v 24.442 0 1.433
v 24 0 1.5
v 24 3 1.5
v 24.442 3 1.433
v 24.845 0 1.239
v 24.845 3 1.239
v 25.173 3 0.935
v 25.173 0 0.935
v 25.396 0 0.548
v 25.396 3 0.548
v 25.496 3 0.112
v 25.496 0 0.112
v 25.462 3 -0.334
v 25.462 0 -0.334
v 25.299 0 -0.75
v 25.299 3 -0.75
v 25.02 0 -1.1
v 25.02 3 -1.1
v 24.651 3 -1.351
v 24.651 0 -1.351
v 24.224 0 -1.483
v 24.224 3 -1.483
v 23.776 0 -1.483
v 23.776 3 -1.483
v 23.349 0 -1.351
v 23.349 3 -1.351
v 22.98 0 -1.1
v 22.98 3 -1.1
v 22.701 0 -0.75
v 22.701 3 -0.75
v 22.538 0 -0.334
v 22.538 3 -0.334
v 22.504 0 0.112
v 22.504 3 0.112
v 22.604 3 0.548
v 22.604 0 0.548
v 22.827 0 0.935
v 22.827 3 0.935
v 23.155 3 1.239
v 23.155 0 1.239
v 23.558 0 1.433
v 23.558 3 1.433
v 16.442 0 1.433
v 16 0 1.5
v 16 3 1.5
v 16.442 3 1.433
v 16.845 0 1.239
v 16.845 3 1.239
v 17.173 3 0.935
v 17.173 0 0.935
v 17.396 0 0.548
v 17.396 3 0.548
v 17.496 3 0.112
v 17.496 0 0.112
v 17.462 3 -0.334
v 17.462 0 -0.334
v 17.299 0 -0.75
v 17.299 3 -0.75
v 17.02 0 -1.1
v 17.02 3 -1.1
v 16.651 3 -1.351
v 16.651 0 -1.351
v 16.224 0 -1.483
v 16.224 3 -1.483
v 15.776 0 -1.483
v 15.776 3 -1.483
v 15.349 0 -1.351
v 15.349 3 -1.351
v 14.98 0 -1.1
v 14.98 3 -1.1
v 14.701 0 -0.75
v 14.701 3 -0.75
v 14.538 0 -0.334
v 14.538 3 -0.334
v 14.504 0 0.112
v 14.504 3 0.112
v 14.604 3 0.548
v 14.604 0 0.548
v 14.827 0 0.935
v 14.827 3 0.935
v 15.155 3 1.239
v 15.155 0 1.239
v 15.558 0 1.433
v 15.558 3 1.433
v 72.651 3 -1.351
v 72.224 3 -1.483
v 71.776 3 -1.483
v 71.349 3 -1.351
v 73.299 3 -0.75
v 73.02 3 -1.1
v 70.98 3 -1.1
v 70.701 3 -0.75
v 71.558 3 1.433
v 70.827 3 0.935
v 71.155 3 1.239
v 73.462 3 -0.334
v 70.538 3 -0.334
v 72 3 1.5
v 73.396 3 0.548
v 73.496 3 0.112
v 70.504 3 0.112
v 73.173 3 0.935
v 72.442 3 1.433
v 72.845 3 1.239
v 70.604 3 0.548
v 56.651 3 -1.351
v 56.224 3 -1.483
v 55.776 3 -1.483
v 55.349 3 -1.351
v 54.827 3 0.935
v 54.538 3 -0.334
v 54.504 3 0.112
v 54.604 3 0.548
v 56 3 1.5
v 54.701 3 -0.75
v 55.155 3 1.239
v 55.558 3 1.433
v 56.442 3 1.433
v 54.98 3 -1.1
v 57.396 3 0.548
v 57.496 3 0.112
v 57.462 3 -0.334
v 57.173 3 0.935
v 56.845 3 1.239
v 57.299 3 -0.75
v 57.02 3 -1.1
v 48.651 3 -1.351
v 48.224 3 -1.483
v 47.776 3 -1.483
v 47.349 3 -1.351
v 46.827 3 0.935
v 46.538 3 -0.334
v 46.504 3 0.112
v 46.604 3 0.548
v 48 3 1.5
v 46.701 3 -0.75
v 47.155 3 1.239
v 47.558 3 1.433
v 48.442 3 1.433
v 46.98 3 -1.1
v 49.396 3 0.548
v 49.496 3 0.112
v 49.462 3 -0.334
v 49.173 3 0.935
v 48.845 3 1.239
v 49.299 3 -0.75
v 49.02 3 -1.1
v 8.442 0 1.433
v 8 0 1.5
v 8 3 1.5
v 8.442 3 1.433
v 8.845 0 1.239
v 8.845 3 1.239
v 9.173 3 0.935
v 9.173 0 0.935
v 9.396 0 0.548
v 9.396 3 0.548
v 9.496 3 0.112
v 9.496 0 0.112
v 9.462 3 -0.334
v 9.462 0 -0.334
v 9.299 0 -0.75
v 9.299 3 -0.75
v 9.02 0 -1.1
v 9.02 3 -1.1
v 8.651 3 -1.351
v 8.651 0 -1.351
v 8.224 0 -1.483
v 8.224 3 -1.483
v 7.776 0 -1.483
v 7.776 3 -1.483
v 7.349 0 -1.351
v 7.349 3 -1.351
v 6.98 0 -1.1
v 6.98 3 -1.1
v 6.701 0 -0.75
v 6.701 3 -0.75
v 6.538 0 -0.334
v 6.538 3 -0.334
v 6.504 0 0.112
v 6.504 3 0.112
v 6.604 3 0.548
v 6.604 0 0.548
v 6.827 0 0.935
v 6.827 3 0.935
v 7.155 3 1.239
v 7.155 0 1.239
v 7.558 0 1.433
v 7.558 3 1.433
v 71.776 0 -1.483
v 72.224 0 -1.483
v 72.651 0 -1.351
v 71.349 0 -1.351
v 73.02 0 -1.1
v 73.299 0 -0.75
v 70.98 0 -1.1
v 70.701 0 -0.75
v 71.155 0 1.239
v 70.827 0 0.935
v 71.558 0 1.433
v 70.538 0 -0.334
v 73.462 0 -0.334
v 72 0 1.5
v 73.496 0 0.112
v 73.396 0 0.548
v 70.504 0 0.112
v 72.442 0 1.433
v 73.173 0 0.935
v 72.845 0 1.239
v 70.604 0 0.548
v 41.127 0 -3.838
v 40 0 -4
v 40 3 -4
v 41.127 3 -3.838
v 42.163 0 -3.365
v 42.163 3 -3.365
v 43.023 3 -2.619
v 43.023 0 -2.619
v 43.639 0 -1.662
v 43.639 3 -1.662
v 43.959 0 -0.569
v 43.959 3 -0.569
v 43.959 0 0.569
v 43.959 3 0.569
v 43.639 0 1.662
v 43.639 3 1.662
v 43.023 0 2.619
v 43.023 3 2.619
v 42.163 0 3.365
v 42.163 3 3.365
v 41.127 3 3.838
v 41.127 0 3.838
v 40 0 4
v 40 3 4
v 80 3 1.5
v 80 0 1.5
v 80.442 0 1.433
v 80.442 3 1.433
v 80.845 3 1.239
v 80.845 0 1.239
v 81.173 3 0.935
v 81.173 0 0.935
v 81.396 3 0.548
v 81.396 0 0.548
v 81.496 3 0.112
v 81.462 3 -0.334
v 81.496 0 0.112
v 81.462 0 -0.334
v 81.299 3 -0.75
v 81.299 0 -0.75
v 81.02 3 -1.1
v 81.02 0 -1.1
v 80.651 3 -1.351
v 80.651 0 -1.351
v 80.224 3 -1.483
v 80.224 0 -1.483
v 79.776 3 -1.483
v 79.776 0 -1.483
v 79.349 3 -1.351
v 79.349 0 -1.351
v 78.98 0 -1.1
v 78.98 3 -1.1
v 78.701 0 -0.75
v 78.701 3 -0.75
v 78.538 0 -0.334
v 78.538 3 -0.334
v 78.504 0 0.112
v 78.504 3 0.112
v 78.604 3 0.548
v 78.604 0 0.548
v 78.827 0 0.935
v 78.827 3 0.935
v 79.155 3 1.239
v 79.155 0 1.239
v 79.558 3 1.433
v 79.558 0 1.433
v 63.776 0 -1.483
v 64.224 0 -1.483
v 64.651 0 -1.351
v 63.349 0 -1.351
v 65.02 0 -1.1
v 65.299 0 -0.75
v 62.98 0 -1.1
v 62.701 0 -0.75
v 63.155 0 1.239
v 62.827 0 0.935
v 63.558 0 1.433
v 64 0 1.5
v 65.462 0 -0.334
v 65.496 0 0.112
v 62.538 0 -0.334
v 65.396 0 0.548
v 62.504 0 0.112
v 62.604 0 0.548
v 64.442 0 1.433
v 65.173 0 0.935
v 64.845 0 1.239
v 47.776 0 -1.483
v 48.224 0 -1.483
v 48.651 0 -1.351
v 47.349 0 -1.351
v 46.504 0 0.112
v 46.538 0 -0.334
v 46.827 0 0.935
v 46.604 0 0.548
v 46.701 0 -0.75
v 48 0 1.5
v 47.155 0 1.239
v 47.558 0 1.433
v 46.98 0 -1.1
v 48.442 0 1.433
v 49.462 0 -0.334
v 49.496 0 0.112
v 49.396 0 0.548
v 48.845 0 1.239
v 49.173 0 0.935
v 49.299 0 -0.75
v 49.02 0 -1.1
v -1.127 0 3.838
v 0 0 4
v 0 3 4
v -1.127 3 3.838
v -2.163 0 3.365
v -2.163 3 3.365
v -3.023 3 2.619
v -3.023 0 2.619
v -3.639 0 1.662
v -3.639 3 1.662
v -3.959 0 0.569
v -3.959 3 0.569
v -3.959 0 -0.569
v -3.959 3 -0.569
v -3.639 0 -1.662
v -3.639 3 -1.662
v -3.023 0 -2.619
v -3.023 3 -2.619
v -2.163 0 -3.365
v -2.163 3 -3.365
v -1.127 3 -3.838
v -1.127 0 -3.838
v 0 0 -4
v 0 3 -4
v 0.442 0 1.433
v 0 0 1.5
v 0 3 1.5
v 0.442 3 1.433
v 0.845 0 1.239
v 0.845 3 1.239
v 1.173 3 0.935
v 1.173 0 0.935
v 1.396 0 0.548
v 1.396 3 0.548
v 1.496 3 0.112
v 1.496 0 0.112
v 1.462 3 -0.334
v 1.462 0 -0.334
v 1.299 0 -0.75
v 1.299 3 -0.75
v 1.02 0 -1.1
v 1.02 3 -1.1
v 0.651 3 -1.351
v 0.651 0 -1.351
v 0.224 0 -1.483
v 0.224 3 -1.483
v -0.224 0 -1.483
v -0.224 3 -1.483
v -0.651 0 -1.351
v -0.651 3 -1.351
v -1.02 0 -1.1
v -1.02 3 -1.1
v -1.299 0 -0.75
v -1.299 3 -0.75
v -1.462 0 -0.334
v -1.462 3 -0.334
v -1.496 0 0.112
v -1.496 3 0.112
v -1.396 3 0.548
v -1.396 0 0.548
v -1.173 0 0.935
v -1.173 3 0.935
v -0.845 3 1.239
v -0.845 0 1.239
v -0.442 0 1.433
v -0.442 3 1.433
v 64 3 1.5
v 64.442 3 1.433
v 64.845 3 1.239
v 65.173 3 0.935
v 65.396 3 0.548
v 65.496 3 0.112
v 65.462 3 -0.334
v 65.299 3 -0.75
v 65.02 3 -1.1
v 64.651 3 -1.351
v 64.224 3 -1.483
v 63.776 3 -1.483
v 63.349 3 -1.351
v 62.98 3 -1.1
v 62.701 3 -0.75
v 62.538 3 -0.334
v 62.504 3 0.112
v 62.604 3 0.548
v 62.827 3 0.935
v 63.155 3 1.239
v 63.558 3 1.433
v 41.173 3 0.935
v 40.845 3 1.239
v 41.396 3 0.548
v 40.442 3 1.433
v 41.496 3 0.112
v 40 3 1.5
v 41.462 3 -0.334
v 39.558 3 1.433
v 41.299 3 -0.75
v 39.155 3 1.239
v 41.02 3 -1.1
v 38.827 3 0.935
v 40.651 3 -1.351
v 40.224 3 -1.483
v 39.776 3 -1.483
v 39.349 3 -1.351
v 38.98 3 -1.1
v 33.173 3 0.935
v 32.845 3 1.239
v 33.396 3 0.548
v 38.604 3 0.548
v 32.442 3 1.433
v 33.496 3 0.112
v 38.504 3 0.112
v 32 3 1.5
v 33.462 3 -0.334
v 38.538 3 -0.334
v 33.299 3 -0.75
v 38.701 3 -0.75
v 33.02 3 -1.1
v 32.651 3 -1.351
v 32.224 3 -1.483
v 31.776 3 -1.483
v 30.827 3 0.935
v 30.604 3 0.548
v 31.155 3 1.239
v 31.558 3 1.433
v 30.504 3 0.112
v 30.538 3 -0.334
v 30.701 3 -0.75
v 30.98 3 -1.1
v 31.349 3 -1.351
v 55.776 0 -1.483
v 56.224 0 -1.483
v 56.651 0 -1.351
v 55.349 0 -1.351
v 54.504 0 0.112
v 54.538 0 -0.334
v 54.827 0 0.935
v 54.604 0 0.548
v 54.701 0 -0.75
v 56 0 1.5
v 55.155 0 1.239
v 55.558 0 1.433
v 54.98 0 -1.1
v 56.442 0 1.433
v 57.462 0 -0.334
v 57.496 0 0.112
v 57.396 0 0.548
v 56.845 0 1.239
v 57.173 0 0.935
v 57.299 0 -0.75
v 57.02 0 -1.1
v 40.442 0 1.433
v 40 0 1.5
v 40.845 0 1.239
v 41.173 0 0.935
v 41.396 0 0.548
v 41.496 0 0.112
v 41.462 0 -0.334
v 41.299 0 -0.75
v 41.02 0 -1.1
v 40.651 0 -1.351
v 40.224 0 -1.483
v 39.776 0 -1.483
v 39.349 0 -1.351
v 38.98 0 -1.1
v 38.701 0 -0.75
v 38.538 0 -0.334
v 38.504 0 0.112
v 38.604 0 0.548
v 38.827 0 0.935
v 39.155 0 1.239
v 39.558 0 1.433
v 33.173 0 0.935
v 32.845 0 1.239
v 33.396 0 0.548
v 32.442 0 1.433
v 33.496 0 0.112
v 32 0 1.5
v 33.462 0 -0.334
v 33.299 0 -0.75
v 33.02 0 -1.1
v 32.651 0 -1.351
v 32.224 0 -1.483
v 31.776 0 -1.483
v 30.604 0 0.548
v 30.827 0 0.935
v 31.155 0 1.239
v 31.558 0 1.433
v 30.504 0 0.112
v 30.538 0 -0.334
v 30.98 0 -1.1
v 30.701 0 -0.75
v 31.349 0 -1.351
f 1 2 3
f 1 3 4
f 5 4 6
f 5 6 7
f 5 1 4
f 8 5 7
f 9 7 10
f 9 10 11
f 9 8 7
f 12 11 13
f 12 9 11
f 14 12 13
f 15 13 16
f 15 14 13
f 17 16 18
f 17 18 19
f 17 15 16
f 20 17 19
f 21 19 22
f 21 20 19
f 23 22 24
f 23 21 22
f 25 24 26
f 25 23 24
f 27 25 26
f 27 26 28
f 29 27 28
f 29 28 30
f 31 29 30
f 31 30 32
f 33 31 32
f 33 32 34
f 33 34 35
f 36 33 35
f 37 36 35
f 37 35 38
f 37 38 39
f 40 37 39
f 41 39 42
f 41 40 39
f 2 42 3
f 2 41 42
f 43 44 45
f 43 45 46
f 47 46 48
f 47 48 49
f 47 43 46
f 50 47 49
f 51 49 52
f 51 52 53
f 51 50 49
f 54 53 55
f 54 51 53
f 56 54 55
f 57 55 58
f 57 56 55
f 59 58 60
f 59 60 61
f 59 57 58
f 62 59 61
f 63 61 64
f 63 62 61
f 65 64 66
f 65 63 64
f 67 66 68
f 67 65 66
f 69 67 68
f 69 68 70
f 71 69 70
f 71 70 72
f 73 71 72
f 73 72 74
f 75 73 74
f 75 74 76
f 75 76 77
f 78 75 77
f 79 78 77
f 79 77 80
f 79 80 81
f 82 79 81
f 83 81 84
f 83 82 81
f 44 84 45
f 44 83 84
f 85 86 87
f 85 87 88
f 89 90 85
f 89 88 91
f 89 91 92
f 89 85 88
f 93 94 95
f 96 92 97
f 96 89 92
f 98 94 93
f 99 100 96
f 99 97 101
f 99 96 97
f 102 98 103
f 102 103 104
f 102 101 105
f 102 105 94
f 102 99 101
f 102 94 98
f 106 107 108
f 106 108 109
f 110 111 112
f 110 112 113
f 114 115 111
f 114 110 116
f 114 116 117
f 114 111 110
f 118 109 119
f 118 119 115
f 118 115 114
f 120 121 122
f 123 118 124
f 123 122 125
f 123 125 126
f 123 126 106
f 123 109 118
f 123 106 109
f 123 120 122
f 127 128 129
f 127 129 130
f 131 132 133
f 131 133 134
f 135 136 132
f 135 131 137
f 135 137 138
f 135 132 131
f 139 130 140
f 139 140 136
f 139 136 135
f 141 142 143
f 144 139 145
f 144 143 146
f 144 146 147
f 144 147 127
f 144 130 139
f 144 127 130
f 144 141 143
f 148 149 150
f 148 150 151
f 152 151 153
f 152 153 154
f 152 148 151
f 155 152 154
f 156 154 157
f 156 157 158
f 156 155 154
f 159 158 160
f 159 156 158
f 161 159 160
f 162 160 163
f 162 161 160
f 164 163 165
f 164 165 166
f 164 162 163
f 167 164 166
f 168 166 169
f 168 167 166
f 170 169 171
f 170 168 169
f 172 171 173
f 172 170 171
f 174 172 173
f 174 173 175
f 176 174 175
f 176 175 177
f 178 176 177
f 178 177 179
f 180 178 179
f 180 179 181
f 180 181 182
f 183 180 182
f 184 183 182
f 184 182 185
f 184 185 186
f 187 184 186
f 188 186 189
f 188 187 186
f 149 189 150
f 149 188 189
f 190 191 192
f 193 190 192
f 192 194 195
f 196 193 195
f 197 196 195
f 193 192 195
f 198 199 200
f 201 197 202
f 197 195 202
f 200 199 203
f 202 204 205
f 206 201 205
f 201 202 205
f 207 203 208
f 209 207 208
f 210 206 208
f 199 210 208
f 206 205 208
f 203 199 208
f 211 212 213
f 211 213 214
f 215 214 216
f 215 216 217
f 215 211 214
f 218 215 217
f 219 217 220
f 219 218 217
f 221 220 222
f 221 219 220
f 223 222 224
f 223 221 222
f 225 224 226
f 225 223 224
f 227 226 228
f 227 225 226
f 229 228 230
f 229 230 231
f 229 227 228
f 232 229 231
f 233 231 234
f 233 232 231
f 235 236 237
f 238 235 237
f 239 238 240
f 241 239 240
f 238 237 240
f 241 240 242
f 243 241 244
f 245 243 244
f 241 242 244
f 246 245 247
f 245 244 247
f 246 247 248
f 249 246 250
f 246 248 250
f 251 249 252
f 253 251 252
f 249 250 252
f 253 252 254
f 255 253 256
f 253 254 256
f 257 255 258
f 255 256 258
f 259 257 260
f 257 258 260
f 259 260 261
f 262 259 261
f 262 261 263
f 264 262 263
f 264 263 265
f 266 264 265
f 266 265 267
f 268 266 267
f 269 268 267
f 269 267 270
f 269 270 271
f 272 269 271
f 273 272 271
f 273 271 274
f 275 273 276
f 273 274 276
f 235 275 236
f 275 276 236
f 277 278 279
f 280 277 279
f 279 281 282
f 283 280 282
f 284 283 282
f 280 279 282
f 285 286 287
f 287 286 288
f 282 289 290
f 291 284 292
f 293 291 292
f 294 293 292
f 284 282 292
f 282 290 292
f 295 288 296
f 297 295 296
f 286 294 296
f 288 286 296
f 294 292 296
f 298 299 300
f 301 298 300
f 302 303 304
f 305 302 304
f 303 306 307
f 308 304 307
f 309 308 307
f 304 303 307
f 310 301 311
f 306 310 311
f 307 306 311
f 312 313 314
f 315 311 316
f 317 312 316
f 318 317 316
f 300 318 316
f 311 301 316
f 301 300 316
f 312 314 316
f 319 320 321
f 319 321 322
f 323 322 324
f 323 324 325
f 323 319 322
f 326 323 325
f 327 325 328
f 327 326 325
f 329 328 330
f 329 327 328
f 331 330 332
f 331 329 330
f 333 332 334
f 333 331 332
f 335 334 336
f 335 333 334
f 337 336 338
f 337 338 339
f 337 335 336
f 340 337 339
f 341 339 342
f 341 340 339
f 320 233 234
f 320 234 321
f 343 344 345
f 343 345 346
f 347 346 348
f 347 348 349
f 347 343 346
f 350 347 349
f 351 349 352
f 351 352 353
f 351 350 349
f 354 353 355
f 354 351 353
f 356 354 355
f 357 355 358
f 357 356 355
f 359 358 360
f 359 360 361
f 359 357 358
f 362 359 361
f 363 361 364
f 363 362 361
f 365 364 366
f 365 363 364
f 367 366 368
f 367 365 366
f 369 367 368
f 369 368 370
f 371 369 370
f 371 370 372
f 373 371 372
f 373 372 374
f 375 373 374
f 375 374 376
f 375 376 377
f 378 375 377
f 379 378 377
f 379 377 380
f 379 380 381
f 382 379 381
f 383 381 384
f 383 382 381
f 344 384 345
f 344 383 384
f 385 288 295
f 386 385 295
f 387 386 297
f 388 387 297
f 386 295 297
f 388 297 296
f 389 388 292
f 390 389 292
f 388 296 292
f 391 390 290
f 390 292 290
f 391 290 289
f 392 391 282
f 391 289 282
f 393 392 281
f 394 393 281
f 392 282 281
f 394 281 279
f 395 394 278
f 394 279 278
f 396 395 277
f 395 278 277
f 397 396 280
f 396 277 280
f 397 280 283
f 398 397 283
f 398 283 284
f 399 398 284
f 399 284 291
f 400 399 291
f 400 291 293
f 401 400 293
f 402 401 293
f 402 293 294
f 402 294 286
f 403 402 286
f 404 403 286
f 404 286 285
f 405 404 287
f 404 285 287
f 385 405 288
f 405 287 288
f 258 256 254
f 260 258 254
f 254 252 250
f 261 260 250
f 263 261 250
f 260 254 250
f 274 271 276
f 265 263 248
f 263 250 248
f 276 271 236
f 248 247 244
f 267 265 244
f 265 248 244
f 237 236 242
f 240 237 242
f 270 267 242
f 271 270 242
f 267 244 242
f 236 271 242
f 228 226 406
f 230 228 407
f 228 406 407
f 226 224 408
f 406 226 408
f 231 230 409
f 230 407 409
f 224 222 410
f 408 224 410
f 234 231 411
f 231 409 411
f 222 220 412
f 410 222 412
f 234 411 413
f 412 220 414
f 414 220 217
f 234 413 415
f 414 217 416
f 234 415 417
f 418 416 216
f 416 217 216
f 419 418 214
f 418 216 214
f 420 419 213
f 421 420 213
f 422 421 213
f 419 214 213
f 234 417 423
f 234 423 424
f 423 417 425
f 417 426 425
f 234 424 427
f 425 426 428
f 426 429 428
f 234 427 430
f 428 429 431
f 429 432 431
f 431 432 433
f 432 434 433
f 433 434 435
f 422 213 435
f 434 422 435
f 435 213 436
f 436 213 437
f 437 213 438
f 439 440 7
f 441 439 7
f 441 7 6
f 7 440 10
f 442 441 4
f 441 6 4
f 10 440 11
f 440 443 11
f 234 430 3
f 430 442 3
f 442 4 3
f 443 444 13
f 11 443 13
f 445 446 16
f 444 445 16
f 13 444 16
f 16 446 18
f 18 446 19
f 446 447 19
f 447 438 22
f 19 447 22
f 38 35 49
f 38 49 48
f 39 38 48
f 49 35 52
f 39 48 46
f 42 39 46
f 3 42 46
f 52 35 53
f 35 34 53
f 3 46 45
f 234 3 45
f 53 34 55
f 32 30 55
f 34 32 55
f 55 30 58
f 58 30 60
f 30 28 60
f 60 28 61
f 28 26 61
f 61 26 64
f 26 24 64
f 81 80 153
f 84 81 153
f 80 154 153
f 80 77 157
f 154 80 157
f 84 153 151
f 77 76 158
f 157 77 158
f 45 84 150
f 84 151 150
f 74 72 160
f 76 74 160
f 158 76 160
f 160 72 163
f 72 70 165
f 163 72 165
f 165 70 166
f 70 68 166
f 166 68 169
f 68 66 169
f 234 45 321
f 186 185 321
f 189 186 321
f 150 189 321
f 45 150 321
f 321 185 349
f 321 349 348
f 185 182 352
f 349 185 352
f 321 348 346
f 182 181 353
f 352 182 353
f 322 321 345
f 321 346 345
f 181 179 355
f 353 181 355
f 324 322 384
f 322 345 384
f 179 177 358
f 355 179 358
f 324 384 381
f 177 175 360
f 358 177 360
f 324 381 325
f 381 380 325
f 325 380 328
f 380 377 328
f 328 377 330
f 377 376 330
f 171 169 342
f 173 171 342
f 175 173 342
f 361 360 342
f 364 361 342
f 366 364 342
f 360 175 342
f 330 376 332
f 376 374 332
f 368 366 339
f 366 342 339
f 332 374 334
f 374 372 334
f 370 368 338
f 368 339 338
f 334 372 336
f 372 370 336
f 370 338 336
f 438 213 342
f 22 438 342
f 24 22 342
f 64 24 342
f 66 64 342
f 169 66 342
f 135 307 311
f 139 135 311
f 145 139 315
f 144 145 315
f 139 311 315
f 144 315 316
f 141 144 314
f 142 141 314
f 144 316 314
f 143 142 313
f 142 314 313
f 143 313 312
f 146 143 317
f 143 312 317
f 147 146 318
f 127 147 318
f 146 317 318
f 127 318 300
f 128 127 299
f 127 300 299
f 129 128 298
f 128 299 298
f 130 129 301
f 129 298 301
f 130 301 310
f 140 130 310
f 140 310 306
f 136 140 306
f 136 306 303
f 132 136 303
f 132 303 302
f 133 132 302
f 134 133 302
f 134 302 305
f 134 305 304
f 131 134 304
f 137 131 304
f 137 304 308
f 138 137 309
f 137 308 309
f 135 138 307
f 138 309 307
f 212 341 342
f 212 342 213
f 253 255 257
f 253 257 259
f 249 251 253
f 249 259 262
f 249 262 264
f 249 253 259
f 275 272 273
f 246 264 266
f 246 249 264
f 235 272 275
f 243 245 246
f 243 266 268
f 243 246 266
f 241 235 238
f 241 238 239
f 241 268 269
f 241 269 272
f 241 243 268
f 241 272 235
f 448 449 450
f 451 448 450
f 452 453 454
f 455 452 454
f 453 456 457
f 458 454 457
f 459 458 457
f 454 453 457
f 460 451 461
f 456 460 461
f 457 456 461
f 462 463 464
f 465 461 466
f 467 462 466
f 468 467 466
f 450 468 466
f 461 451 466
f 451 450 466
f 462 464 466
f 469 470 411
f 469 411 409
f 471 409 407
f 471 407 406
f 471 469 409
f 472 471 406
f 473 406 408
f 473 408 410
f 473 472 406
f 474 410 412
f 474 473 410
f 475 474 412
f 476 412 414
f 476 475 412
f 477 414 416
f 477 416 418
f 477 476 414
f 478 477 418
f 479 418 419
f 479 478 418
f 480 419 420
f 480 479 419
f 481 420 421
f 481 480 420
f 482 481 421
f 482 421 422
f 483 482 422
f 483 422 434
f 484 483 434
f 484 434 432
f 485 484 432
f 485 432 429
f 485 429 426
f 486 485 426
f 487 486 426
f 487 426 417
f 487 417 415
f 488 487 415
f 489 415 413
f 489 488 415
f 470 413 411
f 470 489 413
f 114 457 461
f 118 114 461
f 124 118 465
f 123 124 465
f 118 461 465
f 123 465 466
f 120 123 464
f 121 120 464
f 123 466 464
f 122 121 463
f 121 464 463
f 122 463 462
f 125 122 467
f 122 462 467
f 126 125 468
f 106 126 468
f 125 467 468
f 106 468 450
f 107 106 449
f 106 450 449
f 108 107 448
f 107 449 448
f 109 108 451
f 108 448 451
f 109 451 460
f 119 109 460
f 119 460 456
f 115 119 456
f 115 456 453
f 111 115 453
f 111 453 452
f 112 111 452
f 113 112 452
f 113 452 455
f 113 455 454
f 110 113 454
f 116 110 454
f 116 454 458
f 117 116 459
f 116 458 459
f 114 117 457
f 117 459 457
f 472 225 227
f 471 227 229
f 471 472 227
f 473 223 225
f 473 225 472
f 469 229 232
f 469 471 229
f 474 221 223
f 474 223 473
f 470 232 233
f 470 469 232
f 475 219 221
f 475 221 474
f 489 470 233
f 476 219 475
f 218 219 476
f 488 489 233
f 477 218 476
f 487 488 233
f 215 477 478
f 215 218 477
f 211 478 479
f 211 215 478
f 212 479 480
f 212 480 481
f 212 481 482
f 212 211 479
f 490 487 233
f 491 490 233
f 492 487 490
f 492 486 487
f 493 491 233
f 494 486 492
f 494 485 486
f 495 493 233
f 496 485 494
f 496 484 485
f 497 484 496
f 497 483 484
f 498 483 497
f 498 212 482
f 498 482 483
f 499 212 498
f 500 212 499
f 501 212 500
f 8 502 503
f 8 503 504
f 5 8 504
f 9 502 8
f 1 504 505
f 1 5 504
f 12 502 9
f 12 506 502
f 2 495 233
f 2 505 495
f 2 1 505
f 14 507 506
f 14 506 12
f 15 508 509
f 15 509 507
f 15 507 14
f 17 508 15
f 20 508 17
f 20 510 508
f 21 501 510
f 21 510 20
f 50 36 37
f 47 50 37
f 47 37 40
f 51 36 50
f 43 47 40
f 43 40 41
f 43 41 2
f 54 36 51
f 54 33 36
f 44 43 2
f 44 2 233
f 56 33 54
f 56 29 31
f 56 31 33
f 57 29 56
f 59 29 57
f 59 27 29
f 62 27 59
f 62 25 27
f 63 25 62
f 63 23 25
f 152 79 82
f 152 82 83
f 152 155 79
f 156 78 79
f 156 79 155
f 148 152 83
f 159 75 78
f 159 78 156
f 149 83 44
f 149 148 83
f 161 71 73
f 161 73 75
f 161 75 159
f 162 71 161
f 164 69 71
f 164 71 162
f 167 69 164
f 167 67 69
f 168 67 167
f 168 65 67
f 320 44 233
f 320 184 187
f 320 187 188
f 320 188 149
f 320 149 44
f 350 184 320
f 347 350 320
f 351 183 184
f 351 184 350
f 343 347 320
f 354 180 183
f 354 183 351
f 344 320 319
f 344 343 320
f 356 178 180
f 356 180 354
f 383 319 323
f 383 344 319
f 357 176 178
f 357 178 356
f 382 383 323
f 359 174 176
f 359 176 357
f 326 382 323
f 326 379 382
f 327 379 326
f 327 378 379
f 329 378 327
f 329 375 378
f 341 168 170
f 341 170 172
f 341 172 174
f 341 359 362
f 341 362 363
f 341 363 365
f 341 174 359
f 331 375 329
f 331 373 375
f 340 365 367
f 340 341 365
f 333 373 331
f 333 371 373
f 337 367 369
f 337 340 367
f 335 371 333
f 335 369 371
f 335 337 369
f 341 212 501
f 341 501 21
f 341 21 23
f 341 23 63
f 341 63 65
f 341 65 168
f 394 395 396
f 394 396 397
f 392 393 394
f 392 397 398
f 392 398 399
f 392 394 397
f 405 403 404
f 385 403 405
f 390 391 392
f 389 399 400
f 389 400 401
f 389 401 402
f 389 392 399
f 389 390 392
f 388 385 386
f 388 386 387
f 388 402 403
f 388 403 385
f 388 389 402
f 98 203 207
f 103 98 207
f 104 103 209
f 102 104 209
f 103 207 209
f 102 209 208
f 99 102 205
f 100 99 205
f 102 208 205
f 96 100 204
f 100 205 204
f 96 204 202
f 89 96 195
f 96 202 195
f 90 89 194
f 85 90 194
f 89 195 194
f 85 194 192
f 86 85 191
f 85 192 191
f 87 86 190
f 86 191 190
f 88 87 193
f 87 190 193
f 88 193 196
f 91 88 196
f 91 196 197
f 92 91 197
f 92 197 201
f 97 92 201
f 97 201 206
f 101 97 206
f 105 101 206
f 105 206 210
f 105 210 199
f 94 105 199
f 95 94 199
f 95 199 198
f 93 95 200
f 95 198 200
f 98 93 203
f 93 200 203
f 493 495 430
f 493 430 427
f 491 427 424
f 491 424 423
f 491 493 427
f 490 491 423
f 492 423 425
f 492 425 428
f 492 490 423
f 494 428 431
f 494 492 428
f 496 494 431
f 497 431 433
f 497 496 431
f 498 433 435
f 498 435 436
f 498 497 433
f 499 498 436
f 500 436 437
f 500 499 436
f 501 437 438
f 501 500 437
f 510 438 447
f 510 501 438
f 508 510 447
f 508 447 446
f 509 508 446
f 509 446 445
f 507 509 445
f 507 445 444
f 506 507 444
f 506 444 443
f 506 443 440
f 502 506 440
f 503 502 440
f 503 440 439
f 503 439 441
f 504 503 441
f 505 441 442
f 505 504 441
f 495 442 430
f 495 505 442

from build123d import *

# Parameters (mm, degrees)
SKETCH2_R             = 1.5
BOSS_EXTRUDE2_DEPTH   = 3
BOSS_EXTRUDE2_2_DEPTH = 3
BOSS_EXTRUDE2_3_DEPTH = 3
BOSS_EXTRUDE2_4_DEPTH = 3
BOSS_EXTRUDE2_5_DEPTH = 3
BOSS_EXTRUDE2_6_DEPTH = 3


with BuildPart() as part:
    # Sketch2 → Boss-Extrude2 (new body)
    with BuildSketch(Plane(origin=(0, 0, 0), x_dir=(1, 0, 0), z_dir=(0, 1, 0))):
        with Locations(Location((48, 0, 0), (0, 0, 270))):
            Circle(SKETCH2_R)
    extrude(amount=BOSS_EXTRUDE2_DEPTH)


with BuildPart() as body_2:
    # Sketch2 → Boss-Extrude2 2 (new body)
    with BuildSketch(Plane(origin=(0, 0, 0), x_dir=(1, 0, 0), z_dir=(0, 1, 0))):
        with Locations(Location((56, 0, 0), (0, 0, 270))):
            Circle(SKETCH2_R)
    extrude(amount=BOSS_EXTRUDE2_2_DEPTH)


with BuildPart() as body_3:
    # Sketch2 → Boss-Extrude2 3 (new body)
    with BuildSketch(Plane(origin=(0, 0, 0), x_dir=(1, 0, 0), z_dir=(0, 1, 0))):
        with Locations(Location((64, 0, 0), (0, 0, 270))):
            Circle(SKETCH2_R)
    extrude(amount=BOSS_EXTRUDE2_3_DEPTH)


with BuildPart() as body_4:
    # Sketch2 → Boss-Extrude2 4 (new body)
    with BuildSketch(Plane(origin=(0, 0, 0), x_dir=(1, 0, 0), z_dir=(0, 1, 0))):
        with Locations(Location((72, 0, 0), (0, 0, 270))):
            Circle(SKETCH2_R)
    extrude(amount=BOSS_EXTRUDE2_4_DEPTH)


with BuildPart() as body_5:
    # Sketch2 → Boss-Extrude2 5 (new body)
    with BuildSketch(Plane(origin=(0, 0, 0), x_dir=(1, 0, 0), z_dir=(0, 1, 0))):
        with Locations(Location((80, 0, 0), (0, 0, 270))):
            Circle(SKETCH2_R)
    extrude(amount=BOSS_EXTRUDE2_5_DEPTH)


with BuildPart() as body_6:
    # Sketch2 → Boss-Extrude2 6 (new body)
    with BuildSketch(Plane(origin=(0, 0, 0), x_dir=(1, 0, 0), z_dir=(0, 1, 0))):
        with BuildLine():
            Line((0, 4), (40, 4))
            ThreePointArc((40, 4), (44, 0), (40, -4))
            Line((40, -4), (0, -4))
            ThreePointArc((0, -4), (-4, 0), (0, 4))
        make_face()
        with Locations(Location((0, 0, 0), (0, 0, 270))):
            Circle(SKETCH2_R, mode=Mode.SUBTRACT)
        with Locations(Location((8, 0, 0), (0, 0, 270))):
            Circle(SKETCH2_R, mode=Mode.SUBTRACT)
        with Locations(Location((16, 0, 0), (0, 0, 270))):
            Circle(SKETCH2_R, mode=Mode.SUBTRACT)
        with Locations(Location((24, 0, 0), (0, 0, 270))):
            Circle(SKETCH2_R, mode=Mode.SUBTRACT)
        with Locations(Location((32, 0, 0), (0, 0, 270))):
            Circle(SKETCH2_R, mode=Mode.SUBTRACT)
        with Locations(Location((40, 0, 0), (0, 0, 270))):
            Circle(SKETCH2_R, mode=Mode.SUBTRACT)
    extrude(amount=BOSS_EXTRUDE2_6_DEPTH)


solid = Compound([part.part, body_2.part, body_3.part, body_4.part, body_5.part, body_6.part])
